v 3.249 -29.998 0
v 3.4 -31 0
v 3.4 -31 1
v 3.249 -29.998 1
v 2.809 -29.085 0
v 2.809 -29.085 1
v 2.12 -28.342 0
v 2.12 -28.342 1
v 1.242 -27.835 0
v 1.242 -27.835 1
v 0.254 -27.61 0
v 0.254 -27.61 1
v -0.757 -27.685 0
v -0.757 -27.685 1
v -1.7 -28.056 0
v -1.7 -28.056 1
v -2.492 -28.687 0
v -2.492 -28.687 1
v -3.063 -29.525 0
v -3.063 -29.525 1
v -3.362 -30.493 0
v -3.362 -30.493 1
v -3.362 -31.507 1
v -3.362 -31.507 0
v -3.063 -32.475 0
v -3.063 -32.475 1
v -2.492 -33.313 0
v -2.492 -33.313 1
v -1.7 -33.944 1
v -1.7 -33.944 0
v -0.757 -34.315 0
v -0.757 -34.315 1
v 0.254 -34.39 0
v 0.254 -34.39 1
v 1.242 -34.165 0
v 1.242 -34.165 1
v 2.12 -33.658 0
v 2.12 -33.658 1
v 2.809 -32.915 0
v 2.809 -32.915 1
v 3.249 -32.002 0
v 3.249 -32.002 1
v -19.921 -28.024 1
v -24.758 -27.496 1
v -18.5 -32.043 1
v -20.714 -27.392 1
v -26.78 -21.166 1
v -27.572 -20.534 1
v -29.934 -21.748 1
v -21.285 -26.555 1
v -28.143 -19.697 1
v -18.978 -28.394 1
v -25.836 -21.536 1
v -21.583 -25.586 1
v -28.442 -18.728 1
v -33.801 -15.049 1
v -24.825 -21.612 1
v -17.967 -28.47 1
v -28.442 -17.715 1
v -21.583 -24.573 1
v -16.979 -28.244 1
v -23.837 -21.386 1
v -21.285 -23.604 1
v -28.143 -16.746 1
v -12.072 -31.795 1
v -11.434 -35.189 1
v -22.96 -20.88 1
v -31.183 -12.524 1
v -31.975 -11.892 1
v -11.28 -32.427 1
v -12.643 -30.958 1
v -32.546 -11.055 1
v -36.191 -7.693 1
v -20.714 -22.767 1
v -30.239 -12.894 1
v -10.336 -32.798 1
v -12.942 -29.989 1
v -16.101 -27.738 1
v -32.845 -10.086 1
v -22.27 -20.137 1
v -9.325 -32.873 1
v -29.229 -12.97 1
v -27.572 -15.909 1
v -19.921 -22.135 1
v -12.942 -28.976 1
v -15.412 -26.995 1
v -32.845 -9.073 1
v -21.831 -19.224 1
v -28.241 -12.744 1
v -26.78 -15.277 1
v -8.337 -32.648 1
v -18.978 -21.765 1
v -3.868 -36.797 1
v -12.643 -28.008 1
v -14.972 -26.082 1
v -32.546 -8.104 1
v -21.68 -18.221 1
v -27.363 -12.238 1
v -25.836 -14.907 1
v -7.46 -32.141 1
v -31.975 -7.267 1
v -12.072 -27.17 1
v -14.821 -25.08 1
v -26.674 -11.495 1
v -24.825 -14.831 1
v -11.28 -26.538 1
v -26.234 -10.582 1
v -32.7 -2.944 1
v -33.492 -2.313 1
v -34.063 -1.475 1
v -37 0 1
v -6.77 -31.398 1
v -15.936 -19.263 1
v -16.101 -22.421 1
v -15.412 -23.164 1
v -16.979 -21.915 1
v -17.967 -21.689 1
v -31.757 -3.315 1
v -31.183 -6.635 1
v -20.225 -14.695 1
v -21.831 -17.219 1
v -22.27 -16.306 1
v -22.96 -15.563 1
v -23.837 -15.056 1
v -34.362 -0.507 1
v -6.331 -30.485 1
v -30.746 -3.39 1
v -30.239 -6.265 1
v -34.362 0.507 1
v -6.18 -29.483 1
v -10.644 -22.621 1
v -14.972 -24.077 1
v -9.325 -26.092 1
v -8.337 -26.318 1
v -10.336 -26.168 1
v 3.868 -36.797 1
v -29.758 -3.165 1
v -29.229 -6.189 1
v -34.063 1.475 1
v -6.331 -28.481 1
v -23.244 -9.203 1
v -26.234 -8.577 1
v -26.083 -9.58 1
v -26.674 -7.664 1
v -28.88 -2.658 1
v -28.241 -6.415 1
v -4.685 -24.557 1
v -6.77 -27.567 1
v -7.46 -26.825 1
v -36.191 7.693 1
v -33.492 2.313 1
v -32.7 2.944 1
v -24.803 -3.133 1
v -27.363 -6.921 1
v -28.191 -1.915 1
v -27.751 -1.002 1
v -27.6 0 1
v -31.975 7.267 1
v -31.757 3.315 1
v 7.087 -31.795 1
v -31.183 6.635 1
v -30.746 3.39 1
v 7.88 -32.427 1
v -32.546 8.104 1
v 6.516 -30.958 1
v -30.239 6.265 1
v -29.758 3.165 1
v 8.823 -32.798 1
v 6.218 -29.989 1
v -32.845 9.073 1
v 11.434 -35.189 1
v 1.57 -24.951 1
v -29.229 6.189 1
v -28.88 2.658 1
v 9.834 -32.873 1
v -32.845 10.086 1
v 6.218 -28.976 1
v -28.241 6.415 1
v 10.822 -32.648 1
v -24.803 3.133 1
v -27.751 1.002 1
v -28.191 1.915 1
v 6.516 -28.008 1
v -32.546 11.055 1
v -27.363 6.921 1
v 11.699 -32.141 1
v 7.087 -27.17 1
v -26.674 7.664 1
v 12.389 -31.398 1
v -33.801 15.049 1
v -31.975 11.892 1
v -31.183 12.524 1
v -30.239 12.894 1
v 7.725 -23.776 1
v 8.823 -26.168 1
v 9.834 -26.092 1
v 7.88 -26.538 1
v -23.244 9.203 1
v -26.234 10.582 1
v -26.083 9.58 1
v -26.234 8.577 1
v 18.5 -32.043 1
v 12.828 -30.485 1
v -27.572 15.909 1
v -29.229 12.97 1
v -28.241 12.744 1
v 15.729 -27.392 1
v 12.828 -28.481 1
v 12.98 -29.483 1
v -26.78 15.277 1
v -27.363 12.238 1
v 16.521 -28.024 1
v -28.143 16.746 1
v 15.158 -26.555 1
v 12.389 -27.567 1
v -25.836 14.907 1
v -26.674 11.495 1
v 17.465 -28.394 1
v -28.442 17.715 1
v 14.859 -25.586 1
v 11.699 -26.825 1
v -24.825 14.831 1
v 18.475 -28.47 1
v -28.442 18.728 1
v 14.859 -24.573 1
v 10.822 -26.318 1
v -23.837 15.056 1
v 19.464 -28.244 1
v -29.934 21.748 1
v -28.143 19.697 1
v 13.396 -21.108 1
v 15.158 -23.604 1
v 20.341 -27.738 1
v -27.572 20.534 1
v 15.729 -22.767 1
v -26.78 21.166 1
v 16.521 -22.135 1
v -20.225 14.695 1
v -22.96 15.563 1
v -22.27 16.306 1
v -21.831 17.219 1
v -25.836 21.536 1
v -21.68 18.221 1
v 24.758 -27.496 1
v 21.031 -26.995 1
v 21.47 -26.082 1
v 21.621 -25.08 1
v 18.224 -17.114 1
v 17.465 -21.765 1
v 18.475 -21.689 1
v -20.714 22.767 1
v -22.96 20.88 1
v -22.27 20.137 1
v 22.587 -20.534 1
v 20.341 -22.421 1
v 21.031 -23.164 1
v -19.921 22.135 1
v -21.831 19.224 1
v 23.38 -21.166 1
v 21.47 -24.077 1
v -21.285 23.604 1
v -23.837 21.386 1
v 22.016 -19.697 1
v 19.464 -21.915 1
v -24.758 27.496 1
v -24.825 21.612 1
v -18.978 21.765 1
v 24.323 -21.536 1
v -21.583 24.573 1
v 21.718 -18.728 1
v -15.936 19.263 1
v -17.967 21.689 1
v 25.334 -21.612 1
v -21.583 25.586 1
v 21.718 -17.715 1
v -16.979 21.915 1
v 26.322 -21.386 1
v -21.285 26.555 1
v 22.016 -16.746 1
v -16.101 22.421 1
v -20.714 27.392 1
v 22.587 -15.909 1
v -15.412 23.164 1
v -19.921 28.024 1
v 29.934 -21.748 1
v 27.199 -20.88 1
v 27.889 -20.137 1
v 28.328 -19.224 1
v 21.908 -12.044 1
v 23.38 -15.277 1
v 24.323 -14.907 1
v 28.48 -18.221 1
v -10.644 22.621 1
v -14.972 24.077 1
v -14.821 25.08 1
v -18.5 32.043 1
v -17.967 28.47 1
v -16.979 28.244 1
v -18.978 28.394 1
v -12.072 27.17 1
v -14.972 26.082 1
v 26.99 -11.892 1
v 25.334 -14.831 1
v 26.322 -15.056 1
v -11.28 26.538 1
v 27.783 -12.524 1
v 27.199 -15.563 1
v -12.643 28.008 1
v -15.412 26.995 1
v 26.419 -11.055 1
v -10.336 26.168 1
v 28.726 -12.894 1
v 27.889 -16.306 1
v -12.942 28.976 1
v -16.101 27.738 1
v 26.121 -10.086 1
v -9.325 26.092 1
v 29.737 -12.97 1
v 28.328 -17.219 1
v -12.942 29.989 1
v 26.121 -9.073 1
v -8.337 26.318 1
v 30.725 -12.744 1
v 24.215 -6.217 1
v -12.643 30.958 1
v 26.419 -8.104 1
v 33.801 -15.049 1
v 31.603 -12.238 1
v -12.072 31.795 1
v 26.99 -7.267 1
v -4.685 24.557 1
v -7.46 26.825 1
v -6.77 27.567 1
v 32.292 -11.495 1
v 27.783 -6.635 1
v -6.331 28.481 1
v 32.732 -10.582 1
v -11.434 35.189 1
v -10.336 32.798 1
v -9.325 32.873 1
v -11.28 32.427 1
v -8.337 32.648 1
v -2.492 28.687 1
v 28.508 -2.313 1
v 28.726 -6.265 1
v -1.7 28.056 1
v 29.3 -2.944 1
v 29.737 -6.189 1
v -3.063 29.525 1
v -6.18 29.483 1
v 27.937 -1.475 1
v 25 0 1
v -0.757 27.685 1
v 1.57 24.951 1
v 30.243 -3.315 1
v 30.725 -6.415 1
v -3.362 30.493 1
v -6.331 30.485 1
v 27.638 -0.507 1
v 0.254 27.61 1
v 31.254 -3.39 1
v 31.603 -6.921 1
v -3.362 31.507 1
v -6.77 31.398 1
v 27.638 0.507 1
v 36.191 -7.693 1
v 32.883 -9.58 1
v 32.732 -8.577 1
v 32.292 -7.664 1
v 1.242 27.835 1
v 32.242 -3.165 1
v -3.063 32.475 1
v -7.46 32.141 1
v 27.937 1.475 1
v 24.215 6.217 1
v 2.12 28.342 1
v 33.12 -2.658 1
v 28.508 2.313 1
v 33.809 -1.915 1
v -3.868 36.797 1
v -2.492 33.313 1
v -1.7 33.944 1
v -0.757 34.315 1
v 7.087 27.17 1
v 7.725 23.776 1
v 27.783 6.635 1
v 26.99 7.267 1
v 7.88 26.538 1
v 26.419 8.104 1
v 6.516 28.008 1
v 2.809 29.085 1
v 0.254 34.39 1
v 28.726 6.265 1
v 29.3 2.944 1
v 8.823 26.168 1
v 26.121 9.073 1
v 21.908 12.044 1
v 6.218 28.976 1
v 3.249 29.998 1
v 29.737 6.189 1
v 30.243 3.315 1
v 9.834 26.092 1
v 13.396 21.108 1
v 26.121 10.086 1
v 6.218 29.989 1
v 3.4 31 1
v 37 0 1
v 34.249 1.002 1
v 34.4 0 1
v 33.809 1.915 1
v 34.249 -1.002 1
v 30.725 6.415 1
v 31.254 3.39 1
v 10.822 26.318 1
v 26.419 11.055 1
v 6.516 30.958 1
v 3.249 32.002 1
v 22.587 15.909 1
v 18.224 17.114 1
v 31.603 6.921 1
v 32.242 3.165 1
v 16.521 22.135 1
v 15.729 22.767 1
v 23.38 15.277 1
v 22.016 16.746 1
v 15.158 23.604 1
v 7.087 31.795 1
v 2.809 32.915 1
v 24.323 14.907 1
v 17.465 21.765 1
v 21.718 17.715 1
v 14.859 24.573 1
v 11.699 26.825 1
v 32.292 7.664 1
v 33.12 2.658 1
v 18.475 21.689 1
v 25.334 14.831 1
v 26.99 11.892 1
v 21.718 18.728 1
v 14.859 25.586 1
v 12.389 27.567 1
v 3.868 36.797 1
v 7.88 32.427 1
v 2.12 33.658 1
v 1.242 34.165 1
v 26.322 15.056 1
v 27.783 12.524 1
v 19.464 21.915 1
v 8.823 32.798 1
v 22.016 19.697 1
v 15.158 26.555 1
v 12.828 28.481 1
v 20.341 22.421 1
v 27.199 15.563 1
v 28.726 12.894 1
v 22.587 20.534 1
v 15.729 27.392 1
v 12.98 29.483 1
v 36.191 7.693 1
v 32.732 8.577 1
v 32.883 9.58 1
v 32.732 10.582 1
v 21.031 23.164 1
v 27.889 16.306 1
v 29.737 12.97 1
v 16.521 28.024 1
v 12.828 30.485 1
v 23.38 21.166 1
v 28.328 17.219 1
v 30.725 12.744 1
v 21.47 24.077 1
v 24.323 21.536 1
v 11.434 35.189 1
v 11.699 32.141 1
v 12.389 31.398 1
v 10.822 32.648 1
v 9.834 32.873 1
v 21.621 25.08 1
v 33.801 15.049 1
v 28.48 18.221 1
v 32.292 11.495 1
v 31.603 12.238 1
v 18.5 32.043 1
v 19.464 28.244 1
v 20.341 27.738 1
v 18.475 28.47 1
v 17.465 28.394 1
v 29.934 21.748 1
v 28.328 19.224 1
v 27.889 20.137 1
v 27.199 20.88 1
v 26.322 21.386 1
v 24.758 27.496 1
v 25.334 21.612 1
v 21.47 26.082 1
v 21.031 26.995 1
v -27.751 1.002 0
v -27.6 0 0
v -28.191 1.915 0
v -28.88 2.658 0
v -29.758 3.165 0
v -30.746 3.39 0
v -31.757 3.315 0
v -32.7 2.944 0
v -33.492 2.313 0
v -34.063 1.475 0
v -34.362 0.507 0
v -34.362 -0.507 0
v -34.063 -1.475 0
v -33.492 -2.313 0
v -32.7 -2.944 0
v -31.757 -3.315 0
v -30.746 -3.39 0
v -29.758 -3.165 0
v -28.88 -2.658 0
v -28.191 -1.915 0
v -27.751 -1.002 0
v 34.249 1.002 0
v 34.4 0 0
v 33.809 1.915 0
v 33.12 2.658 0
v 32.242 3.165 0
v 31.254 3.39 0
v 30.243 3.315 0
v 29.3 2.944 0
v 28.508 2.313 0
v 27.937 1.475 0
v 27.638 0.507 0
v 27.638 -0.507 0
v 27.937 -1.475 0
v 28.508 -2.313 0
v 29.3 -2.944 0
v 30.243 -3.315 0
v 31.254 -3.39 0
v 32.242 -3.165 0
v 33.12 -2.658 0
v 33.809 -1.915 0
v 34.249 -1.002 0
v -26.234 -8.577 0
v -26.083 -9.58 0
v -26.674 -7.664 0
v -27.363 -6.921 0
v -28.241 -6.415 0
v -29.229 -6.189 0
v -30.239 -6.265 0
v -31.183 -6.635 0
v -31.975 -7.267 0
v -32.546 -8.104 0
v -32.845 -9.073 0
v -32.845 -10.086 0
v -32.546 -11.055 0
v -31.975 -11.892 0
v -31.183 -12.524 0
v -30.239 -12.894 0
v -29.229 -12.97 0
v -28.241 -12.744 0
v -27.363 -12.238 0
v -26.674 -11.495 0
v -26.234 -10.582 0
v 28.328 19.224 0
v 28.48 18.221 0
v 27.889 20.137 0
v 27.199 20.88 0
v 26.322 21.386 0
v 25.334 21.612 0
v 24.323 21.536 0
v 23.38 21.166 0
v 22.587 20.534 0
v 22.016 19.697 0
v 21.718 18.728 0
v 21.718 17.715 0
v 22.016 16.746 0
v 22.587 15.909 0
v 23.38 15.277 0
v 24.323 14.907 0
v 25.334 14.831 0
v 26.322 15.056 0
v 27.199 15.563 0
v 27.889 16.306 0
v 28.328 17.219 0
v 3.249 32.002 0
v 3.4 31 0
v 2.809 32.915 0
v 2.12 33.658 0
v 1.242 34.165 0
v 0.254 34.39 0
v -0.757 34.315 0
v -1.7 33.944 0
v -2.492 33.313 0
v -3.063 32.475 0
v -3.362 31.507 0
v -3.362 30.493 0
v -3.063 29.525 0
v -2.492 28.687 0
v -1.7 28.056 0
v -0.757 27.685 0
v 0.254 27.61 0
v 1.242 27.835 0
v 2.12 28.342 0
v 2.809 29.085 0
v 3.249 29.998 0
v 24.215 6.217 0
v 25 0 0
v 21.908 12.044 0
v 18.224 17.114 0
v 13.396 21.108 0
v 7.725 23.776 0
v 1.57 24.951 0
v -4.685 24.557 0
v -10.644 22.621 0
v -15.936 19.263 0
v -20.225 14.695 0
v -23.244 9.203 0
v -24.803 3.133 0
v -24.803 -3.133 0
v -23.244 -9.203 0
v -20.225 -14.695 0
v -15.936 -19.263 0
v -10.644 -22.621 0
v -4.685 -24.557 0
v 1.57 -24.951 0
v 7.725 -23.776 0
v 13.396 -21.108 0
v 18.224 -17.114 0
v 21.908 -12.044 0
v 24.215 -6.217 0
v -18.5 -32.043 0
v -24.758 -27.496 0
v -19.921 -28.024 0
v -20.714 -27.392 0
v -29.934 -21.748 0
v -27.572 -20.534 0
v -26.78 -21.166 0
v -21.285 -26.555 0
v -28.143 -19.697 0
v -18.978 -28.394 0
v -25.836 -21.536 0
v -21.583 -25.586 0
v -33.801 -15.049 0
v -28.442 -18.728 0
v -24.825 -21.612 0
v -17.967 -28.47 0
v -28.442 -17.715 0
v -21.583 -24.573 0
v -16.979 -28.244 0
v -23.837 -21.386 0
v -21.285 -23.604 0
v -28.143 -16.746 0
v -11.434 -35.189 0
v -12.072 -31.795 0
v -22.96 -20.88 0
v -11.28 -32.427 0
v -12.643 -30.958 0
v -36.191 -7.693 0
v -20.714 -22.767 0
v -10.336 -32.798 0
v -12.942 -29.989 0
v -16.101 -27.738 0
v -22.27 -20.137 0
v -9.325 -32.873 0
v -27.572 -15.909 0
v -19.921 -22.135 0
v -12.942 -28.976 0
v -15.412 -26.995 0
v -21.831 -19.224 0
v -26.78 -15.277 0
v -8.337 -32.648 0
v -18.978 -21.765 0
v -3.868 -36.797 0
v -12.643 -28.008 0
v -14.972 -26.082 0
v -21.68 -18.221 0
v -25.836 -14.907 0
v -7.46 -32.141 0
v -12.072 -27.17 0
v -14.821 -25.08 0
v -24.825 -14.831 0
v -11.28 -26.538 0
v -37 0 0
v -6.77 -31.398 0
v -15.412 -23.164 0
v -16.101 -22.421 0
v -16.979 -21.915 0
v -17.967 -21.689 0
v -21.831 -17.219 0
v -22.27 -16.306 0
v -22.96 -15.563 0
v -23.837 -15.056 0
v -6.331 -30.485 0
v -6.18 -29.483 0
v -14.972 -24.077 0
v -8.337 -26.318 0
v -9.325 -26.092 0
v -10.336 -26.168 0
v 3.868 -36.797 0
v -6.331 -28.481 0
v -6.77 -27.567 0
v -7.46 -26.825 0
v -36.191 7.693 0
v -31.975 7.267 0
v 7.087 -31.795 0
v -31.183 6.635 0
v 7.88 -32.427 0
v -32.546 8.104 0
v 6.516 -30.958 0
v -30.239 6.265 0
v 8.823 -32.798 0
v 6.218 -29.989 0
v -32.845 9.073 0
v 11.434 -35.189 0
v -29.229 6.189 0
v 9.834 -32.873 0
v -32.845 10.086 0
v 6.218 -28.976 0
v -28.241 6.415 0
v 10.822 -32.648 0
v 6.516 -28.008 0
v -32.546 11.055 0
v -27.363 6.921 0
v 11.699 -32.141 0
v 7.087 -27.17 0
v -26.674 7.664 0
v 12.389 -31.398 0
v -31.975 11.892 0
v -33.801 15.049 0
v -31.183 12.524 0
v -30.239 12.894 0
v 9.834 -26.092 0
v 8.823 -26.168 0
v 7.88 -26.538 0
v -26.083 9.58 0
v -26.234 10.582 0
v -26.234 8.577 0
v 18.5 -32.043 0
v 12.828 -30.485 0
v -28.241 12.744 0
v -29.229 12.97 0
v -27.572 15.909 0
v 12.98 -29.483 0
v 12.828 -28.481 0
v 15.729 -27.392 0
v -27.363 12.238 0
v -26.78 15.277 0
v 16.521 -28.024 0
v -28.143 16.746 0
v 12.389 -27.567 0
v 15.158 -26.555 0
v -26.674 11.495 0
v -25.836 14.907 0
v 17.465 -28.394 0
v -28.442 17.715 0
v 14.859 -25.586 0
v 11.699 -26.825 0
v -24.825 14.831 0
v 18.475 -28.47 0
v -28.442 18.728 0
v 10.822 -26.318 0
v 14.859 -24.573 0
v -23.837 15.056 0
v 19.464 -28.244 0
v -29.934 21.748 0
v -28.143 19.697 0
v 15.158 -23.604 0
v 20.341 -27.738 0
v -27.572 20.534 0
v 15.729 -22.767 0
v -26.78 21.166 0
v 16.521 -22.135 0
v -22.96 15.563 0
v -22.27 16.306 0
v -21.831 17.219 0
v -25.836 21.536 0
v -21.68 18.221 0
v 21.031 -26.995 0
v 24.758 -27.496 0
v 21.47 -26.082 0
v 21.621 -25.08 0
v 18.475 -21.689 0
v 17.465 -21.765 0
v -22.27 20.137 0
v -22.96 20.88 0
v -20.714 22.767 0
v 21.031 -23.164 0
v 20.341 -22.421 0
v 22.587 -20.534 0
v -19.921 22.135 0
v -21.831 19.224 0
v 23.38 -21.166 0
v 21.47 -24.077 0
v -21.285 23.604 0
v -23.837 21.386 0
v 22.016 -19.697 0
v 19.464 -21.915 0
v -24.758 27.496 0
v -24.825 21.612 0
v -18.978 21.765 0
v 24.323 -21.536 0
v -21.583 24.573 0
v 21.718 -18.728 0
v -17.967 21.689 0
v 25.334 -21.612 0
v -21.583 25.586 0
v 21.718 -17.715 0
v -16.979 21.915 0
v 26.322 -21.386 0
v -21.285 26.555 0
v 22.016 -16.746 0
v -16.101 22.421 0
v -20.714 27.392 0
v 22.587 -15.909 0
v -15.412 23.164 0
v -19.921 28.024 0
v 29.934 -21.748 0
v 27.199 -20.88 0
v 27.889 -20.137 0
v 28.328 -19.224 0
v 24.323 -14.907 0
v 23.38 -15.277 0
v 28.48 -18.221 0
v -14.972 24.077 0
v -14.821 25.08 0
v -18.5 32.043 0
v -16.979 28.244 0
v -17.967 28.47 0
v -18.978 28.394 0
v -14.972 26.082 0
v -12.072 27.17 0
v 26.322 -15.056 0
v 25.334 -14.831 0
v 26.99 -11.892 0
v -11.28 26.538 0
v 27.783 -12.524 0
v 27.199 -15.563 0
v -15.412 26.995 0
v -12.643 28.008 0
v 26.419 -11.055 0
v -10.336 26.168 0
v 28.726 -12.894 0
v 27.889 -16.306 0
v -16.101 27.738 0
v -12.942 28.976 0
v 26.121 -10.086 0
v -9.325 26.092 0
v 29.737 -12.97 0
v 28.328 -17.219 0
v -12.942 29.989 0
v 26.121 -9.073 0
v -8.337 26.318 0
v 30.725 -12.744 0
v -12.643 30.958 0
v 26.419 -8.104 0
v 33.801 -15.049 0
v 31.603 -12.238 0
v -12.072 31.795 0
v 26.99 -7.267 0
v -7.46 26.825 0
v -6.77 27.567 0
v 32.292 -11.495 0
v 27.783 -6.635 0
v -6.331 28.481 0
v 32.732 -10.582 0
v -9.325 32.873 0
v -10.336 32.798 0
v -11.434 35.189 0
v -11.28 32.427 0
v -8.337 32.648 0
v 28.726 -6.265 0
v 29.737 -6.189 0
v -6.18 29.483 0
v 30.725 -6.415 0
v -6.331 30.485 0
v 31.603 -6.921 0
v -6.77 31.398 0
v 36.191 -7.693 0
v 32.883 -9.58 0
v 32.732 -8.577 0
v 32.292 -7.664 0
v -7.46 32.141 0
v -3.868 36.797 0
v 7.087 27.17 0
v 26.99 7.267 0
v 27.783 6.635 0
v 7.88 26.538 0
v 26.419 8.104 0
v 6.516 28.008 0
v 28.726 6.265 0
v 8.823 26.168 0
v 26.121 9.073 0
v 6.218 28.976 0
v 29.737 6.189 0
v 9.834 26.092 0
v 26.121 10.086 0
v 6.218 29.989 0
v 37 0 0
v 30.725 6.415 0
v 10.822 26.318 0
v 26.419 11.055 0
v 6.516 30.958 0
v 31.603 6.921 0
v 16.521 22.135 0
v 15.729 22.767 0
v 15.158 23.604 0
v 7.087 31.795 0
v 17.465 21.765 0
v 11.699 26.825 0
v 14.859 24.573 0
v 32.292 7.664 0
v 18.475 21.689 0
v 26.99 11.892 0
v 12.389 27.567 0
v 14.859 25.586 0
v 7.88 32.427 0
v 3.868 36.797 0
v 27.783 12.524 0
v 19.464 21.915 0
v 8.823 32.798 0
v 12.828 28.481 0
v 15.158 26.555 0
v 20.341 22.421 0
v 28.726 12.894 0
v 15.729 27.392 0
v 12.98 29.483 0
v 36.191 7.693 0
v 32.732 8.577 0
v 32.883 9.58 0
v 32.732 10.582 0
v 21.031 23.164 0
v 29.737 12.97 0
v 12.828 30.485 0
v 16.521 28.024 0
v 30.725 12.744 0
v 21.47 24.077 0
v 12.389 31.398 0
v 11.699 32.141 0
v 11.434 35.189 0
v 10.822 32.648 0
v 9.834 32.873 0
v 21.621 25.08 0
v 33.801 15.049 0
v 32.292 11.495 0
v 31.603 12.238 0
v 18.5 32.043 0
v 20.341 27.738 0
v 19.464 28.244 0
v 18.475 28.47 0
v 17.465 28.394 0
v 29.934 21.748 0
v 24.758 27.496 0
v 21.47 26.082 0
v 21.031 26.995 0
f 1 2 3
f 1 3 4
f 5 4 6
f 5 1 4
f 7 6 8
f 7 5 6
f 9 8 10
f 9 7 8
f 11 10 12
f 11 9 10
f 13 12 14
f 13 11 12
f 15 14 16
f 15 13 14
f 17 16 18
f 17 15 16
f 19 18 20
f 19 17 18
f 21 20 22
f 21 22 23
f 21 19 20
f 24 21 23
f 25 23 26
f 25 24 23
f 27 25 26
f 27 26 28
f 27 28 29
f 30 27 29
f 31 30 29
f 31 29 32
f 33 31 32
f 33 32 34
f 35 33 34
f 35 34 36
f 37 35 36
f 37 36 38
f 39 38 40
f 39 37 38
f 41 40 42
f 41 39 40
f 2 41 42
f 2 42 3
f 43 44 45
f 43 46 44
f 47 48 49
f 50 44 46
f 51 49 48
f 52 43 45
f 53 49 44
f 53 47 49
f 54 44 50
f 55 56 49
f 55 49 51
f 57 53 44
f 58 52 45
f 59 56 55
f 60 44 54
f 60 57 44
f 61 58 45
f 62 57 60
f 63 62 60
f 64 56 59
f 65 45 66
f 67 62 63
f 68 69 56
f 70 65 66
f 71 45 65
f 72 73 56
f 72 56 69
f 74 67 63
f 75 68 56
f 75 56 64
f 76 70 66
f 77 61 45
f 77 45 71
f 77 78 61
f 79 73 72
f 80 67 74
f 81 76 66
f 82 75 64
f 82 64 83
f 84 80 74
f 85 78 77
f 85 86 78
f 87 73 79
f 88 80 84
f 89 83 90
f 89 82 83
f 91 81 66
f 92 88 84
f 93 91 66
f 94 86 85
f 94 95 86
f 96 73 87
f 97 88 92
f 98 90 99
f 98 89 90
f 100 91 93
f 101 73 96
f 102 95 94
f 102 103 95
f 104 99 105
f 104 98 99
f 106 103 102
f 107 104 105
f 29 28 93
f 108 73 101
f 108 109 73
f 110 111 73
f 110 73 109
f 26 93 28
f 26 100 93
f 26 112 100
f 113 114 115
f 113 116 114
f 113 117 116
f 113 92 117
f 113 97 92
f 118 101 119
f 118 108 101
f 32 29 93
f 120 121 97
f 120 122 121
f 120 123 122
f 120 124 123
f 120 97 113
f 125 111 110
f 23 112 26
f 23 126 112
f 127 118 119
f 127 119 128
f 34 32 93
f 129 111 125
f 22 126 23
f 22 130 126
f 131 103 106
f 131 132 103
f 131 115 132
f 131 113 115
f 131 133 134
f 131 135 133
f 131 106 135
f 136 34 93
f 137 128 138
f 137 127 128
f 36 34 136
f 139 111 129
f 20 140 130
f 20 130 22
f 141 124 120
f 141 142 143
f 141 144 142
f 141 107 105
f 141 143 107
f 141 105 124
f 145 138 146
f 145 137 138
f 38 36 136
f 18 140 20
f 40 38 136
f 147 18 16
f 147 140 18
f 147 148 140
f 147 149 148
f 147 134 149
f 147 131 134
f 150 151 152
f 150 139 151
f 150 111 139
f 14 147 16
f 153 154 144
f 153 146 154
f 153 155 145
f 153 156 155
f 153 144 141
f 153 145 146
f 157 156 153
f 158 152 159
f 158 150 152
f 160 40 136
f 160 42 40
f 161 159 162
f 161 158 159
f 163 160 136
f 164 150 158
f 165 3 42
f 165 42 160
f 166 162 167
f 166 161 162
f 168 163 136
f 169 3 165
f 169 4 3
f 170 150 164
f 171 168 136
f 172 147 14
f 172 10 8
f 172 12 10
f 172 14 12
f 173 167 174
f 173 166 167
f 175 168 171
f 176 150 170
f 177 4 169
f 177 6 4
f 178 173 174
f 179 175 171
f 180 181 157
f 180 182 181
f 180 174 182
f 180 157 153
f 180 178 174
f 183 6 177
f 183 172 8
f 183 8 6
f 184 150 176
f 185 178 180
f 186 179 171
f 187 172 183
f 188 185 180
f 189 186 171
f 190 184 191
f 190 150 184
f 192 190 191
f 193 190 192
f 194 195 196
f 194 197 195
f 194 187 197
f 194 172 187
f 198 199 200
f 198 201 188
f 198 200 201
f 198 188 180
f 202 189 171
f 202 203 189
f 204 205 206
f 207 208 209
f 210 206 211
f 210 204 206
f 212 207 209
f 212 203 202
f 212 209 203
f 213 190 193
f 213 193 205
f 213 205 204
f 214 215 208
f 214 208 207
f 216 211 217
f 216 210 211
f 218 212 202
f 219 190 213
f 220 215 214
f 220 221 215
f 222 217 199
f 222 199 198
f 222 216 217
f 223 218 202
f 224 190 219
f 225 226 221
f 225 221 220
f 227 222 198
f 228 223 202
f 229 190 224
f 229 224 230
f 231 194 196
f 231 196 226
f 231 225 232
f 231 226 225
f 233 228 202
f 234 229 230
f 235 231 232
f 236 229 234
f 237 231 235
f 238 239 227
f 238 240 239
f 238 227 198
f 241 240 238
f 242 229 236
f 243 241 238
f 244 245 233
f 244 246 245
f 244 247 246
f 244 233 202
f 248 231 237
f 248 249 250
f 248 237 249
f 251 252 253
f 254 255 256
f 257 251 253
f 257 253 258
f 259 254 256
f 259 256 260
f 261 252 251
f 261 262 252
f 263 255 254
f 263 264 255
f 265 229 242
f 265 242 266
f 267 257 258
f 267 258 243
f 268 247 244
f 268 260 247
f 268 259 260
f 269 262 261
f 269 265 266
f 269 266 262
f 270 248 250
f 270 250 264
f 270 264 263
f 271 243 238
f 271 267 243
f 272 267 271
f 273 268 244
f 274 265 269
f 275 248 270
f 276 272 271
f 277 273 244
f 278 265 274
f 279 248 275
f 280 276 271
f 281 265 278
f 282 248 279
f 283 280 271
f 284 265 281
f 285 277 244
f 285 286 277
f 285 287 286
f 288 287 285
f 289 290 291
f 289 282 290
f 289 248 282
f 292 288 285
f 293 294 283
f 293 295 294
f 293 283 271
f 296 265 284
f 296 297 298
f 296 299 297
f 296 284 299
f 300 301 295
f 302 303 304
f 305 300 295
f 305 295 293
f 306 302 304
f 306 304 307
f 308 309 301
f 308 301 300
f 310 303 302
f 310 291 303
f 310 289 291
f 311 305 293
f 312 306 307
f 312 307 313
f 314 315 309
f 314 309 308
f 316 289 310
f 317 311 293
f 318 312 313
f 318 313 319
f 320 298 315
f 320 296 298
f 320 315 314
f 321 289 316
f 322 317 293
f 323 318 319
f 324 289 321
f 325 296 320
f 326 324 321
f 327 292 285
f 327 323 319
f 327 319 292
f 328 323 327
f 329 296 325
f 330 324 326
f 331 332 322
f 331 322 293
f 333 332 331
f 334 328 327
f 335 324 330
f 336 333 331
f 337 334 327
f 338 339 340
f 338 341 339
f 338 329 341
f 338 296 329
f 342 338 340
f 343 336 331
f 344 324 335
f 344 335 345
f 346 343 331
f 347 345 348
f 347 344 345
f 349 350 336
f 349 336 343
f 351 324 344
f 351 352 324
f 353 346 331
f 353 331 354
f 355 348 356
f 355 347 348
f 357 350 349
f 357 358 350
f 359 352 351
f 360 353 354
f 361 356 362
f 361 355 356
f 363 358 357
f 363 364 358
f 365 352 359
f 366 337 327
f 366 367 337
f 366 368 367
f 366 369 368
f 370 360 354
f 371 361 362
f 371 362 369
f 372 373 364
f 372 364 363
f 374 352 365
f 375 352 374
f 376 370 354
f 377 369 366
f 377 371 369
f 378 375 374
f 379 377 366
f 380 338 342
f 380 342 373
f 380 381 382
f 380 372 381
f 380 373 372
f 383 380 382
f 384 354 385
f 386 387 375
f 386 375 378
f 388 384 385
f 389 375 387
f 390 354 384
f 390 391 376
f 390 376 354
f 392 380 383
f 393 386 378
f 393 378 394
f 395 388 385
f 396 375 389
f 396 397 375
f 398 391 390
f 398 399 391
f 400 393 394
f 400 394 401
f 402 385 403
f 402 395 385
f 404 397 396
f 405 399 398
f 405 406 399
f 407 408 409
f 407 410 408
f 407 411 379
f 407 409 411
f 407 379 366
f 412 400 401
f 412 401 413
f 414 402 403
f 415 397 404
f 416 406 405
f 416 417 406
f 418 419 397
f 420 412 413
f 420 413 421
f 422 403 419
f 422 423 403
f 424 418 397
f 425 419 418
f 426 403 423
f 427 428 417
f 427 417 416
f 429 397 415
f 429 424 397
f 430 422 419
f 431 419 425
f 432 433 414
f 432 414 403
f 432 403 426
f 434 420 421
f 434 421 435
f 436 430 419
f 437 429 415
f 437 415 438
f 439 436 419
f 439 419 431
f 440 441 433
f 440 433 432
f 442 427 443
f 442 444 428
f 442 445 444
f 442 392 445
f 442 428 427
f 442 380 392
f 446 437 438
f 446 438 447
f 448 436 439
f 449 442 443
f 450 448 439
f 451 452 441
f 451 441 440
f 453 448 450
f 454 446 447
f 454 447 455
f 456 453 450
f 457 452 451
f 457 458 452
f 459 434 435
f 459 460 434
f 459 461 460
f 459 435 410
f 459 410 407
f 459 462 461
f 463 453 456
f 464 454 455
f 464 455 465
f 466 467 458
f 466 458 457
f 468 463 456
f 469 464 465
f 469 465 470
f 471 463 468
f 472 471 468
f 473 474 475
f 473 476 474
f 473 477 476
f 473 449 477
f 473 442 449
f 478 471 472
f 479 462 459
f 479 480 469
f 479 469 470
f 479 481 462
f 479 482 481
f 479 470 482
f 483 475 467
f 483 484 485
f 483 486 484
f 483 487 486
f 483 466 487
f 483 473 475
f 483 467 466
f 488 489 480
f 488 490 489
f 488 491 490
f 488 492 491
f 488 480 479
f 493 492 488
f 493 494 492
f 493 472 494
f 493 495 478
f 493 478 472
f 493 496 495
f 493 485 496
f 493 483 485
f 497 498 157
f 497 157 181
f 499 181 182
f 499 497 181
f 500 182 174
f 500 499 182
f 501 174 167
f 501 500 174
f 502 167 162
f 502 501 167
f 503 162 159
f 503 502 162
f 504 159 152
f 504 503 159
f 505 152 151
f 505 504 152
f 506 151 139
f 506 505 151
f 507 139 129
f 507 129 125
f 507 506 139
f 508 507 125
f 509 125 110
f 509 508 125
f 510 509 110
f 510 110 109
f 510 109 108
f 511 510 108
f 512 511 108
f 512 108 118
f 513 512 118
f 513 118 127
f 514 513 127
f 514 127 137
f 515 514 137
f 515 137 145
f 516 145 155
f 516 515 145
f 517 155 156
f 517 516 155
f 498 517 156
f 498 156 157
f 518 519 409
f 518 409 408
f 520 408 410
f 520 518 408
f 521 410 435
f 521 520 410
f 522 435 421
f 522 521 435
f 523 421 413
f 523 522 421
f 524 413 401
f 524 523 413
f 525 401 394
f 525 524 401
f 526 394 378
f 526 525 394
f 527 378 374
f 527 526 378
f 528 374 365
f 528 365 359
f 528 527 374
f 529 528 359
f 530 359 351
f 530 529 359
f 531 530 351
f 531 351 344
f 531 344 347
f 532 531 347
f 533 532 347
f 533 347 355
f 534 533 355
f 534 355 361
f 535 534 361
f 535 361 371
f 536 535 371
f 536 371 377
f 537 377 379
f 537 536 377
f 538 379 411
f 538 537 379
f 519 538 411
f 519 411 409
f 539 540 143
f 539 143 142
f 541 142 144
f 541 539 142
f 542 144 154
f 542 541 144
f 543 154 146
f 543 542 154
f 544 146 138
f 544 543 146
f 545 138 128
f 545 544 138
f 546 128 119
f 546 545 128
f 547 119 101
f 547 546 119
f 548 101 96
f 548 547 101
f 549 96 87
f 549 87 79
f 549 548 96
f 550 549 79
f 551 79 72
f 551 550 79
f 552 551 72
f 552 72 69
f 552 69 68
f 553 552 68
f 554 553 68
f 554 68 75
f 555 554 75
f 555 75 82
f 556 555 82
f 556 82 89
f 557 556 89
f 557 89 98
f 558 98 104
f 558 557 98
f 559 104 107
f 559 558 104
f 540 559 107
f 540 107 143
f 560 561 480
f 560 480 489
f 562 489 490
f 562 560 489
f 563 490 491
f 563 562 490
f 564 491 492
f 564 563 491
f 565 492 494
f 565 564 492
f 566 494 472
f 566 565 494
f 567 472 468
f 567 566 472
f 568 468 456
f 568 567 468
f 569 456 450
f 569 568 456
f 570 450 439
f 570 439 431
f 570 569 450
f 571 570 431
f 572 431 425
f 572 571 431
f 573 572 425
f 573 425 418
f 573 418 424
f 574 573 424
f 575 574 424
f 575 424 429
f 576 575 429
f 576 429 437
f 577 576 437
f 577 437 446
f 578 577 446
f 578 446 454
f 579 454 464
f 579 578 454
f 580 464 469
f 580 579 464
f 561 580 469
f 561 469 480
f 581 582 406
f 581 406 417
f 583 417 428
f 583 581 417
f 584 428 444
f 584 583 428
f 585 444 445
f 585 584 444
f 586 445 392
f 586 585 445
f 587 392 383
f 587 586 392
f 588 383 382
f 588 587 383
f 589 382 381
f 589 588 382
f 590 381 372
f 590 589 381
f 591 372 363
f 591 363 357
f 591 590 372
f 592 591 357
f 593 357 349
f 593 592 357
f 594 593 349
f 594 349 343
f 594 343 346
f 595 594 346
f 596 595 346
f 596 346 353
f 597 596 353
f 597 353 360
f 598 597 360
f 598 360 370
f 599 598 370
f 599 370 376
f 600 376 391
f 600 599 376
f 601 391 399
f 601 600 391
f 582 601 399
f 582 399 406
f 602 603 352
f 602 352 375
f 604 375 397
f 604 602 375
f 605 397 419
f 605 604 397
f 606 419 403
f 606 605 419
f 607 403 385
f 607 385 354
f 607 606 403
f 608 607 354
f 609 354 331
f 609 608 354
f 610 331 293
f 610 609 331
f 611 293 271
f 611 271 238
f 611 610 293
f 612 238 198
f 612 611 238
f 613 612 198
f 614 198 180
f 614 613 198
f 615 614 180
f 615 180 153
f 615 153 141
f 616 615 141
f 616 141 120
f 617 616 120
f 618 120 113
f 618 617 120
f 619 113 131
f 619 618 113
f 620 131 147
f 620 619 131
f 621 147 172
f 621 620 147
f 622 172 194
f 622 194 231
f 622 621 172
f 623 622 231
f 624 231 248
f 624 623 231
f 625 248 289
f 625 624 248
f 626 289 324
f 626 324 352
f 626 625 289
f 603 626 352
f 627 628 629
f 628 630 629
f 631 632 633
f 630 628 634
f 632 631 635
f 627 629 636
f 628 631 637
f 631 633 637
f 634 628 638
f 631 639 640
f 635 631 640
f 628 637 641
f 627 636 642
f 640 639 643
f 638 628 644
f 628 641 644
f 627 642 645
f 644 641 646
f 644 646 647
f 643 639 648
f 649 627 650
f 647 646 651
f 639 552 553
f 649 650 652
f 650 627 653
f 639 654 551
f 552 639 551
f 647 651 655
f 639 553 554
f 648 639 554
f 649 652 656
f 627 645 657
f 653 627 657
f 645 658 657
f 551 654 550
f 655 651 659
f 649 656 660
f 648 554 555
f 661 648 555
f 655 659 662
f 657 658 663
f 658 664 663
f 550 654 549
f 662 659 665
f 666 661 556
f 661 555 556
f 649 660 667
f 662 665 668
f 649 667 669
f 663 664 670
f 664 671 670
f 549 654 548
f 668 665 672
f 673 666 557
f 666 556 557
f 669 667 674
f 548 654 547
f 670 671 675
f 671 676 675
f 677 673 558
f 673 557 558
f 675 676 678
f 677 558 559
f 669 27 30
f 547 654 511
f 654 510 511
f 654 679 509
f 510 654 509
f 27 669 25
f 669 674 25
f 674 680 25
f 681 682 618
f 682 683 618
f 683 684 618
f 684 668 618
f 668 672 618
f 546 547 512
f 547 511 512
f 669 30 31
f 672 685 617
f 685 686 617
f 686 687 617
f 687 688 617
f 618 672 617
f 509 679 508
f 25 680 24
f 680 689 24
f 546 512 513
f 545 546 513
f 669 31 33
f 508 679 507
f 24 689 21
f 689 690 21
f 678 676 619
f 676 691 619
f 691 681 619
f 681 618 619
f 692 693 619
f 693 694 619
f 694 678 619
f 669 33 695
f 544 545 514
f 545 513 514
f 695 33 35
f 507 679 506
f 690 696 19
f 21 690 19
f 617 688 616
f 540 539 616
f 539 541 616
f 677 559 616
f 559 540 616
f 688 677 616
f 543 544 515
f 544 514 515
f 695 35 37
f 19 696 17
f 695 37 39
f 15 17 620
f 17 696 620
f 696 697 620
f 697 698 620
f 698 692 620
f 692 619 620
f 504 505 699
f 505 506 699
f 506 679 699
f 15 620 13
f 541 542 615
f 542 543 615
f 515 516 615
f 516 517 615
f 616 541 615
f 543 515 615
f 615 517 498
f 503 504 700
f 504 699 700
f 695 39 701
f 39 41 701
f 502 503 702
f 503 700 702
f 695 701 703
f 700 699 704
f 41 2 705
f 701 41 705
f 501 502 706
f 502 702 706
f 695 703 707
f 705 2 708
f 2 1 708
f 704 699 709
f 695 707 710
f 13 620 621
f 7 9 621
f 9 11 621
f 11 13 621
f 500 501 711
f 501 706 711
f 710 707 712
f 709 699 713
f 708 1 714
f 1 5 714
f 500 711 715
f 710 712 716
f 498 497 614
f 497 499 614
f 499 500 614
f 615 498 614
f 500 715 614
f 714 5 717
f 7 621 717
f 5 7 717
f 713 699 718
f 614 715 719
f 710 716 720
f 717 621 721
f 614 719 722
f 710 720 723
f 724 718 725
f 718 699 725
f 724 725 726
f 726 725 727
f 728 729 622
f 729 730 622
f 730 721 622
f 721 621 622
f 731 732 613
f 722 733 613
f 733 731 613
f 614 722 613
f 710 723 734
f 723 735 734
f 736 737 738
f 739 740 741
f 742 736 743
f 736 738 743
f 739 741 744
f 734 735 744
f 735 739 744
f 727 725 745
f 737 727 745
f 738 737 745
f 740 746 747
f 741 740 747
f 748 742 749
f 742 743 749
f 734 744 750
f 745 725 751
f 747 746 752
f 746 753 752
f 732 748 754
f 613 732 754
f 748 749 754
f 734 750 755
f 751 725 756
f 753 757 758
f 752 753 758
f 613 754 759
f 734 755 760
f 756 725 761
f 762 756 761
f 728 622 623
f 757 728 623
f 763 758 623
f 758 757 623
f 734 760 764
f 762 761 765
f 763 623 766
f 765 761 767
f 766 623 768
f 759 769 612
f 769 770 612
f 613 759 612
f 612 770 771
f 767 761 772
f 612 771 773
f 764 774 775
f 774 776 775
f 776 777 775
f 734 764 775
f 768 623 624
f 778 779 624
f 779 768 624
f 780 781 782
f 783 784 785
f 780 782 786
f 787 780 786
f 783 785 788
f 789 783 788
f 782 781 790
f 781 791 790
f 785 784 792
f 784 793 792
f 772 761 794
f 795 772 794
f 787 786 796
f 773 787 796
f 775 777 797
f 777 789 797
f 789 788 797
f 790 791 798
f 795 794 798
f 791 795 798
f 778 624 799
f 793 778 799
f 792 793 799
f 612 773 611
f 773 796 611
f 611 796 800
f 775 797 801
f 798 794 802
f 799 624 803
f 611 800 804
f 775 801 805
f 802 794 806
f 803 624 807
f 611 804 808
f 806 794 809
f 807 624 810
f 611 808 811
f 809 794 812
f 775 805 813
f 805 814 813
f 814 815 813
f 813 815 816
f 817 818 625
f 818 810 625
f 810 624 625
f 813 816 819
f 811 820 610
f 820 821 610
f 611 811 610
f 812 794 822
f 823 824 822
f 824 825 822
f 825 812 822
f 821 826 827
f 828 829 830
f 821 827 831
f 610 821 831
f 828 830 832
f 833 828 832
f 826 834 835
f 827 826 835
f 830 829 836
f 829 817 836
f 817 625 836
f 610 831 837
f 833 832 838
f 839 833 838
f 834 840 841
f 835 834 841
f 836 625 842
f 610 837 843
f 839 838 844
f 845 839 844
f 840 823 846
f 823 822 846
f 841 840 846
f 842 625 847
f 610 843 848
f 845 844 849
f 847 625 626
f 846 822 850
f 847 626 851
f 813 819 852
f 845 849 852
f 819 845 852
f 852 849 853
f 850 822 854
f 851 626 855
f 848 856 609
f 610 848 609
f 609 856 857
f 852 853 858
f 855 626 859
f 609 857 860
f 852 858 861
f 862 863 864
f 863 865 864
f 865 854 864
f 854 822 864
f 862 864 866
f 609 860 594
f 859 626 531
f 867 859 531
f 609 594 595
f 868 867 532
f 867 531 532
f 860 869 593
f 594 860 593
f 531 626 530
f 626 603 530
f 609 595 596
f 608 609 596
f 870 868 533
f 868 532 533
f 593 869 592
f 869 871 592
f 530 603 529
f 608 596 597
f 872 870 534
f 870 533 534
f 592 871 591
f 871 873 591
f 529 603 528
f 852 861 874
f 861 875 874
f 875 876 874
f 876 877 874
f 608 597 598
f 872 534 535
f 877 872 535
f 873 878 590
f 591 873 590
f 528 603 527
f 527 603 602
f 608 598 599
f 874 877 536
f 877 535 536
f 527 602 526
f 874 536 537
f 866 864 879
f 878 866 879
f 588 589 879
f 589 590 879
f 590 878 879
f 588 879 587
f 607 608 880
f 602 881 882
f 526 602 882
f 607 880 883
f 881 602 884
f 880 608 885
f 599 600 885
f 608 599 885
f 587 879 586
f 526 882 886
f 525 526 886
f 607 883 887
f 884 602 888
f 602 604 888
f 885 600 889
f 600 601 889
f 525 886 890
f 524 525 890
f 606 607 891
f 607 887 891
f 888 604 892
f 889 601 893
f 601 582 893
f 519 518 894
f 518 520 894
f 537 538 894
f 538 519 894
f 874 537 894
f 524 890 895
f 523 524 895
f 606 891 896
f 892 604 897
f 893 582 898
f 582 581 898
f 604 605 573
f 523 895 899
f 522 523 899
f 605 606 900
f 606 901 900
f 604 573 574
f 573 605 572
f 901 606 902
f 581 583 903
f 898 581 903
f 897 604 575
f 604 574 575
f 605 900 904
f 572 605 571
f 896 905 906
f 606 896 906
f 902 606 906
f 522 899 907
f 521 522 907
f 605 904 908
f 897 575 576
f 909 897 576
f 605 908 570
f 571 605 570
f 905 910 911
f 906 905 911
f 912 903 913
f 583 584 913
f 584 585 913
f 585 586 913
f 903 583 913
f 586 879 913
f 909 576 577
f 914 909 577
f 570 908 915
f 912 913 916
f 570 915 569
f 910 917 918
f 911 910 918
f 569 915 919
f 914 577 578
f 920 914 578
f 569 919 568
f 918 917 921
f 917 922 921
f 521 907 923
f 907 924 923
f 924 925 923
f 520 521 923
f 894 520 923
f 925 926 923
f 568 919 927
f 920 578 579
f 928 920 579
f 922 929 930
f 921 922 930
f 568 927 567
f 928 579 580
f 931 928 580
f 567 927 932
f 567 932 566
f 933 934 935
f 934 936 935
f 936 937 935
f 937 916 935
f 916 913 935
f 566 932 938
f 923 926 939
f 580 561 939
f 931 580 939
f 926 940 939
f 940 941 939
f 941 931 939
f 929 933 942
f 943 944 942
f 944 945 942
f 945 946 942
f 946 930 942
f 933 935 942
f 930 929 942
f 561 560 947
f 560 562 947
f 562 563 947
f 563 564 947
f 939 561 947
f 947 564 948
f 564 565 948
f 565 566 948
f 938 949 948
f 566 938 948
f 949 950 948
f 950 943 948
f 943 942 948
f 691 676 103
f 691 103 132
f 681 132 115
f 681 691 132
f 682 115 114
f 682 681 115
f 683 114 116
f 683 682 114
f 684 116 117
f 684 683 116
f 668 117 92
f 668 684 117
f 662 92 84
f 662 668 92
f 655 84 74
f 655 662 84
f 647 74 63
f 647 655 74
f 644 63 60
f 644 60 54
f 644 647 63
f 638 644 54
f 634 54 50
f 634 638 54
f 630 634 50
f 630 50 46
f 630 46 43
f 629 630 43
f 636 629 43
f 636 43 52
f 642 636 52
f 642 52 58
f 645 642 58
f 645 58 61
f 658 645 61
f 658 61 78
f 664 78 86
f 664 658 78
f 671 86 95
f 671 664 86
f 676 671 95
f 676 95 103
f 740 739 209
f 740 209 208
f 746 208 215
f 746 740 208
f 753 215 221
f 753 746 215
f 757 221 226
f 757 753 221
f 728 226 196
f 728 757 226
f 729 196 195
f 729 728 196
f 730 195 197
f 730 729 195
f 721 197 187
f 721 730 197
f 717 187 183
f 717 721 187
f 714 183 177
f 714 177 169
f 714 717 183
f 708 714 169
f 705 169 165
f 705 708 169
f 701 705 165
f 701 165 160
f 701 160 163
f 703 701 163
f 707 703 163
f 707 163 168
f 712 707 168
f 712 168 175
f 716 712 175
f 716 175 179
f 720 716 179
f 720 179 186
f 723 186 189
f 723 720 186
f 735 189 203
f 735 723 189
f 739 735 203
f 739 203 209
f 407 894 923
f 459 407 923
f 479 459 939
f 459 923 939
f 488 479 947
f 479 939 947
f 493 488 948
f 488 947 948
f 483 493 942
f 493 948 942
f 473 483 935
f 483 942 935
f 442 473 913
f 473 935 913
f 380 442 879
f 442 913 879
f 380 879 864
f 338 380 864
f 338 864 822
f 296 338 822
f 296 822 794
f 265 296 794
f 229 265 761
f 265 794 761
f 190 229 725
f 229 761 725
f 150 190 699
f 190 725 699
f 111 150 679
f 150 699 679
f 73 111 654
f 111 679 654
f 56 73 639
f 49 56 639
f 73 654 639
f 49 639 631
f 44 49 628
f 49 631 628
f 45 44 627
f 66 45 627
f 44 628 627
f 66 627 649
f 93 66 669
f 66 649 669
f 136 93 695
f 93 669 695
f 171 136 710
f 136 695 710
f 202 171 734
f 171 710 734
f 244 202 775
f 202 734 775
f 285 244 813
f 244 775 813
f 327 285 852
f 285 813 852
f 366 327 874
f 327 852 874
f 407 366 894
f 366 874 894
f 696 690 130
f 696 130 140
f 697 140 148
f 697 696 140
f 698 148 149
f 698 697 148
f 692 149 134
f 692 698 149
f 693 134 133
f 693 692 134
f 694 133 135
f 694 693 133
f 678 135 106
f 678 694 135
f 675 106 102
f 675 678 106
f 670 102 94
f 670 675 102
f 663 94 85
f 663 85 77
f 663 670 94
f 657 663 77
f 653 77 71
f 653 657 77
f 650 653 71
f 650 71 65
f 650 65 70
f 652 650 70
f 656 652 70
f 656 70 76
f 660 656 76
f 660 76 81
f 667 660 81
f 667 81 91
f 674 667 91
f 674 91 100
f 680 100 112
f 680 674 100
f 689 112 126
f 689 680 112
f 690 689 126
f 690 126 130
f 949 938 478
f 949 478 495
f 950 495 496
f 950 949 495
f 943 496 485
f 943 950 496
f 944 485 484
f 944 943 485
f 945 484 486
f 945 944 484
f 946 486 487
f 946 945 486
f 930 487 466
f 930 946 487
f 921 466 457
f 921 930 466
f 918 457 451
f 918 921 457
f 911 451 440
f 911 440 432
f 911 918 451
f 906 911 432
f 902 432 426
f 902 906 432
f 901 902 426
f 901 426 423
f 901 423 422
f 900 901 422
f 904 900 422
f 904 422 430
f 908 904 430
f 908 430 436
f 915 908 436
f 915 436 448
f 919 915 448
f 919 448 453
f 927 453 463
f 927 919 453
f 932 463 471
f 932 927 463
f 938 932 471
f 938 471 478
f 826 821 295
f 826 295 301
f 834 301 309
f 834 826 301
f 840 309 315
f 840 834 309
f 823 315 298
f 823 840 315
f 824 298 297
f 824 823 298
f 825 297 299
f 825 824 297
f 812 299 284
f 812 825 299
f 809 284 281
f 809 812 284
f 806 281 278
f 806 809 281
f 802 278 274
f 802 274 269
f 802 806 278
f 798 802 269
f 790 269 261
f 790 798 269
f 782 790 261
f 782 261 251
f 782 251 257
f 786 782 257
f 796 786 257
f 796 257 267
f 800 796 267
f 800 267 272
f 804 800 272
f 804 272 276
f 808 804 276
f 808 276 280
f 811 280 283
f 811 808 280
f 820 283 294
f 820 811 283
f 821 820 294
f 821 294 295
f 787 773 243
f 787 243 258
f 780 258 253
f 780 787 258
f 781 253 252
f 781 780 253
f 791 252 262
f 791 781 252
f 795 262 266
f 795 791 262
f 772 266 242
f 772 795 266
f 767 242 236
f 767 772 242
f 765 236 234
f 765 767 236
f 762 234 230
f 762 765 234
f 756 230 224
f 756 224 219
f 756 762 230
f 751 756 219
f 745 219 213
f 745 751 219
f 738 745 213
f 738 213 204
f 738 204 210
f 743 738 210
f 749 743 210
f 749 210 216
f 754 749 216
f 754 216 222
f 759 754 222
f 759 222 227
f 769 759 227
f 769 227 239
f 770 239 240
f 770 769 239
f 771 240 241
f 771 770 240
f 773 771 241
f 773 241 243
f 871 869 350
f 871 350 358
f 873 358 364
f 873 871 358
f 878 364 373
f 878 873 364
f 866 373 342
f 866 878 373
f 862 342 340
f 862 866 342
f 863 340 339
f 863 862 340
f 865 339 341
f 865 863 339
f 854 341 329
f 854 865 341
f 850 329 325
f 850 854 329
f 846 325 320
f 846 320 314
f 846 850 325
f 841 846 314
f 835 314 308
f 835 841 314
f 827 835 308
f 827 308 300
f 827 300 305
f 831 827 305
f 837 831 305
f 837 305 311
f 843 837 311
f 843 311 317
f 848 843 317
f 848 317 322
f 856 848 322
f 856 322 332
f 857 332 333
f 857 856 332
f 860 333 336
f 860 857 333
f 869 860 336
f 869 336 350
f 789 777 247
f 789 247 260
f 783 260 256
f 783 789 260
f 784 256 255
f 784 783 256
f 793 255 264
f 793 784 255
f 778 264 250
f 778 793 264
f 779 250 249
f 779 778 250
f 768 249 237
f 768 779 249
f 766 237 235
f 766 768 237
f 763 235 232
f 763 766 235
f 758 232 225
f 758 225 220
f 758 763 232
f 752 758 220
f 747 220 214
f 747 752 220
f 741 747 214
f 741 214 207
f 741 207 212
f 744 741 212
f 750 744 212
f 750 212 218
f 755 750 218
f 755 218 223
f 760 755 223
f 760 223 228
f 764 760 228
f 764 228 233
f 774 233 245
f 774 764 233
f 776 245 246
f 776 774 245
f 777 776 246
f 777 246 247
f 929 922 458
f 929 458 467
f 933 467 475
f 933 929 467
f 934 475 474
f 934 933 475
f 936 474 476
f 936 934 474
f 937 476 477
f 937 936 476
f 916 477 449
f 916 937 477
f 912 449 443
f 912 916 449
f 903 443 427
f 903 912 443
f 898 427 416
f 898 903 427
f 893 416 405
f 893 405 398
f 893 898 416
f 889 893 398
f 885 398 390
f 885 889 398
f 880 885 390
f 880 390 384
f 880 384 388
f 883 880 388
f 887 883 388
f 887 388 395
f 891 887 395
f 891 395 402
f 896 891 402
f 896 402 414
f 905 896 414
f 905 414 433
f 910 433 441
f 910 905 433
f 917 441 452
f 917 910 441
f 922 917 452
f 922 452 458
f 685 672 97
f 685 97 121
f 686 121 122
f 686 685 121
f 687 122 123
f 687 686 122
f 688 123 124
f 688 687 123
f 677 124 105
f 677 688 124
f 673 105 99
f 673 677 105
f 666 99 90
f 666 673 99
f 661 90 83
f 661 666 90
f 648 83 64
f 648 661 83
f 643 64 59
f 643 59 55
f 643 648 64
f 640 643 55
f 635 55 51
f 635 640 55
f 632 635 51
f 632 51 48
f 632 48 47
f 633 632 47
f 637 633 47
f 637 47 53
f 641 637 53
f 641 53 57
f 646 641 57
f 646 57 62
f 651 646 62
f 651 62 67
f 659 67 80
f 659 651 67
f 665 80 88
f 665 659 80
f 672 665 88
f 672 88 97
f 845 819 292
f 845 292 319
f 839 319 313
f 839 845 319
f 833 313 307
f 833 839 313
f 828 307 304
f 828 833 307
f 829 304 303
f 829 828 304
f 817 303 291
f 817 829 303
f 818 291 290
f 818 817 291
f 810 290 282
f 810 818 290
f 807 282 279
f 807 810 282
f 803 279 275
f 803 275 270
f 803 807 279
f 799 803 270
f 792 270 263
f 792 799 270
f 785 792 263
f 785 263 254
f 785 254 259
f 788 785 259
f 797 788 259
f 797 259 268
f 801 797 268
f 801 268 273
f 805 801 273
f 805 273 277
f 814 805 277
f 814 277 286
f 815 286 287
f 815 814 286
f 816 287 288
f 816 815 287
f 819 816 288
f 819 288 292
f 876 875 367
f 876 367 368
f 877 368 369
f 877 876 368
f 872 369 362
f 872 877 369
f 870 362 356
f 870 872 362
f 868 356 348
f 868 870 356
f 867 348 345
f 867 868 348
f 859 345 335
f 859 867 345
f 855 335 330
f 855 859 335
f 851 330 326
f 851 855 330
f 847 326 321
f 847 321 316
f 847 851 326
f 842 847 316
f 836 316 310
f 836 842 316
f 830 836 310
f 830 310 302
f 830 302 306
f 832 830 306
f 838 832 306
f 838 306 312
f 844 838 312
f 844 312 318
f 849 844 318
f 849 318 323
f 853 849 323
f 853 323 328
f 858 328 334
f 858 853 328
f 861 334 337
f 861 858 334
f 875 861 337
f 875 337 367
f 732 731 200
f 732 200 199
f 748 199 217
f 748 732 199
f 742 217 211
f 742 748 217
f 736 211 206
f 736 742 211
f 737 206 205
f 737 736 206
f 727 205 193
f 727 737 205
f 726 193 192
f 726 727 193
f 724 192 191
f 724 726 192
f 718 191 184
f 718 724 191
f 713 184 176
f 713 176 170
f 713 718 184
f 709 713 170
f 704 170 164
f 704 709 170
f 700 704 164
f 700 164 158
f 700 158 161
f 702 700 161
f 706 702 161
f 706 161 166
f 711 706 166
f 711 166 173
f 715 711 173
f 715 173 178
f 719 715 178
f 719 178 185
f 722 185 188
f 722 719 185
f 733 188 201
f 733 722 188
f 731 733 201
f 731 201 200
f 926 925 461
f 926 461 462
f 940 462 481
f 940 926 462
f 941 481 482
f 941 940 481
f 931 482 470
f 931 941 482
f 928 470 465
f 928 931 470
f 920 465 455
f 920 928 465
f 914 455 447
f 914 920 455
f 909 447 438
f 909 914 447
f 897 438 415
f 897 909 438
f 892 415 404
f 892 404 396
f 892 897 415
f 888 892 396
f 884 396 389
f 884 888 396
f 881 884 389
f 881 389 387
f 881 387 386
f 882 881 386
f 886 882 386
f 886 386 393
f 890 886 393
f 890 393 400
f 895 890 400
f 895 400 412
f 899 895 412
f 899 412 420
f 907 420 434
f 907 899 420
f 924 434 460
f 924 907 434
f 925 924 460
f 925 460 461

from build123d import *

# Parameters (mm, degrees)
F0_R     = 37
F0_R_2   = 3.4
F0_R_3   = 25
F1_DEPTH = 1


with BuildPart() as f1:
    # F0 (on Top) → F1 (new body)
    with BuildSketch(Plane.XY):
        Circle(F0_R)
        with Locations((-9.579527, -29.482752)):
            Circle(F0_R_2, mode=Mode.SUBTRACT)
        with Locations((-18.221343, -25.079527)):
            Circle(F0_R_2, mode=Mode.SUBTRACT)
        with Locations((-29.482752, -9.579527)):
            Circle(F0_R_2, mode=Mode.SUBTRACT)
        with Locations((-25.079527, -18.221343)):
            Circle(F0_R_2, mode=Mode.SUBTRACT)
        with Locations((0, -31)):
            Circle(F0_R_2, mode=Mode.SUBTRACT)
        with Locations((9.579527, -29.482752)):
            Circle(F0_R_2, mode=Mode.SUBTRACT)
        with Locations((18.221343, -25.079527)):
            Circle(F0_R_2, mode=Mode.SUBTRACT)
        with Locations((25.079527, -18.221343)):
            Circle(F0_R_2, mode=Mode.SUBTRACT)
        with Locations((29.482752, -9.579527)):
            Circle(F0_R_2, mode=Mode.SUBTRACT)
        with Locations((-31, 0)):
            Circle(F0_R_2, mode=Mode.SUBTRACT)
        with Locations((-29.482752, 9.579527)):
            Circle(F0_R_2, mode=Mode.SUBTRACT)
        with Locations((-25.079527, 18.221343)):
            Circle(F0_R_2, mode=Mode.SUBTRACT)
        with Locations((-18.221343, 25.079527)):
            Circle(F0_R_2, mode=Mode.SUBTRACT)
        with Locations((-9.579527, 29.482752)):
            Circle(F0_R_2, mode=Mode.SUBTRACT)
        Circle(F0_R_3, mode=Mode.SUBTRACT)
        with Locations((31, 0)):
            Circle(F0_R_2, mode=Mode.SUBTRACT)
        with Locations((25.079527, 18.221343)):
            Circle(F0_R_2, mode=Mode.SUBTRACT)
        with Locations((29.482752, 9.579527)):
            Circle(F0_R_2, mode=Mode.SUBTRACT)
        with Locations((18.221343, 25.079527)):
            Circle(F0_R_2, mode=Mode.SUBTRACT)
        with Locations((0, 31)):
            Circle(F0_R_2, mode=Mode.SUBTRACT)
        with Locations((9.579527, 29.482752)):
            Circle(F0_R_2, mode=Mode.SUBTRACT)
    extrude(amount=F1_DEPTH)


solid = f1.part
